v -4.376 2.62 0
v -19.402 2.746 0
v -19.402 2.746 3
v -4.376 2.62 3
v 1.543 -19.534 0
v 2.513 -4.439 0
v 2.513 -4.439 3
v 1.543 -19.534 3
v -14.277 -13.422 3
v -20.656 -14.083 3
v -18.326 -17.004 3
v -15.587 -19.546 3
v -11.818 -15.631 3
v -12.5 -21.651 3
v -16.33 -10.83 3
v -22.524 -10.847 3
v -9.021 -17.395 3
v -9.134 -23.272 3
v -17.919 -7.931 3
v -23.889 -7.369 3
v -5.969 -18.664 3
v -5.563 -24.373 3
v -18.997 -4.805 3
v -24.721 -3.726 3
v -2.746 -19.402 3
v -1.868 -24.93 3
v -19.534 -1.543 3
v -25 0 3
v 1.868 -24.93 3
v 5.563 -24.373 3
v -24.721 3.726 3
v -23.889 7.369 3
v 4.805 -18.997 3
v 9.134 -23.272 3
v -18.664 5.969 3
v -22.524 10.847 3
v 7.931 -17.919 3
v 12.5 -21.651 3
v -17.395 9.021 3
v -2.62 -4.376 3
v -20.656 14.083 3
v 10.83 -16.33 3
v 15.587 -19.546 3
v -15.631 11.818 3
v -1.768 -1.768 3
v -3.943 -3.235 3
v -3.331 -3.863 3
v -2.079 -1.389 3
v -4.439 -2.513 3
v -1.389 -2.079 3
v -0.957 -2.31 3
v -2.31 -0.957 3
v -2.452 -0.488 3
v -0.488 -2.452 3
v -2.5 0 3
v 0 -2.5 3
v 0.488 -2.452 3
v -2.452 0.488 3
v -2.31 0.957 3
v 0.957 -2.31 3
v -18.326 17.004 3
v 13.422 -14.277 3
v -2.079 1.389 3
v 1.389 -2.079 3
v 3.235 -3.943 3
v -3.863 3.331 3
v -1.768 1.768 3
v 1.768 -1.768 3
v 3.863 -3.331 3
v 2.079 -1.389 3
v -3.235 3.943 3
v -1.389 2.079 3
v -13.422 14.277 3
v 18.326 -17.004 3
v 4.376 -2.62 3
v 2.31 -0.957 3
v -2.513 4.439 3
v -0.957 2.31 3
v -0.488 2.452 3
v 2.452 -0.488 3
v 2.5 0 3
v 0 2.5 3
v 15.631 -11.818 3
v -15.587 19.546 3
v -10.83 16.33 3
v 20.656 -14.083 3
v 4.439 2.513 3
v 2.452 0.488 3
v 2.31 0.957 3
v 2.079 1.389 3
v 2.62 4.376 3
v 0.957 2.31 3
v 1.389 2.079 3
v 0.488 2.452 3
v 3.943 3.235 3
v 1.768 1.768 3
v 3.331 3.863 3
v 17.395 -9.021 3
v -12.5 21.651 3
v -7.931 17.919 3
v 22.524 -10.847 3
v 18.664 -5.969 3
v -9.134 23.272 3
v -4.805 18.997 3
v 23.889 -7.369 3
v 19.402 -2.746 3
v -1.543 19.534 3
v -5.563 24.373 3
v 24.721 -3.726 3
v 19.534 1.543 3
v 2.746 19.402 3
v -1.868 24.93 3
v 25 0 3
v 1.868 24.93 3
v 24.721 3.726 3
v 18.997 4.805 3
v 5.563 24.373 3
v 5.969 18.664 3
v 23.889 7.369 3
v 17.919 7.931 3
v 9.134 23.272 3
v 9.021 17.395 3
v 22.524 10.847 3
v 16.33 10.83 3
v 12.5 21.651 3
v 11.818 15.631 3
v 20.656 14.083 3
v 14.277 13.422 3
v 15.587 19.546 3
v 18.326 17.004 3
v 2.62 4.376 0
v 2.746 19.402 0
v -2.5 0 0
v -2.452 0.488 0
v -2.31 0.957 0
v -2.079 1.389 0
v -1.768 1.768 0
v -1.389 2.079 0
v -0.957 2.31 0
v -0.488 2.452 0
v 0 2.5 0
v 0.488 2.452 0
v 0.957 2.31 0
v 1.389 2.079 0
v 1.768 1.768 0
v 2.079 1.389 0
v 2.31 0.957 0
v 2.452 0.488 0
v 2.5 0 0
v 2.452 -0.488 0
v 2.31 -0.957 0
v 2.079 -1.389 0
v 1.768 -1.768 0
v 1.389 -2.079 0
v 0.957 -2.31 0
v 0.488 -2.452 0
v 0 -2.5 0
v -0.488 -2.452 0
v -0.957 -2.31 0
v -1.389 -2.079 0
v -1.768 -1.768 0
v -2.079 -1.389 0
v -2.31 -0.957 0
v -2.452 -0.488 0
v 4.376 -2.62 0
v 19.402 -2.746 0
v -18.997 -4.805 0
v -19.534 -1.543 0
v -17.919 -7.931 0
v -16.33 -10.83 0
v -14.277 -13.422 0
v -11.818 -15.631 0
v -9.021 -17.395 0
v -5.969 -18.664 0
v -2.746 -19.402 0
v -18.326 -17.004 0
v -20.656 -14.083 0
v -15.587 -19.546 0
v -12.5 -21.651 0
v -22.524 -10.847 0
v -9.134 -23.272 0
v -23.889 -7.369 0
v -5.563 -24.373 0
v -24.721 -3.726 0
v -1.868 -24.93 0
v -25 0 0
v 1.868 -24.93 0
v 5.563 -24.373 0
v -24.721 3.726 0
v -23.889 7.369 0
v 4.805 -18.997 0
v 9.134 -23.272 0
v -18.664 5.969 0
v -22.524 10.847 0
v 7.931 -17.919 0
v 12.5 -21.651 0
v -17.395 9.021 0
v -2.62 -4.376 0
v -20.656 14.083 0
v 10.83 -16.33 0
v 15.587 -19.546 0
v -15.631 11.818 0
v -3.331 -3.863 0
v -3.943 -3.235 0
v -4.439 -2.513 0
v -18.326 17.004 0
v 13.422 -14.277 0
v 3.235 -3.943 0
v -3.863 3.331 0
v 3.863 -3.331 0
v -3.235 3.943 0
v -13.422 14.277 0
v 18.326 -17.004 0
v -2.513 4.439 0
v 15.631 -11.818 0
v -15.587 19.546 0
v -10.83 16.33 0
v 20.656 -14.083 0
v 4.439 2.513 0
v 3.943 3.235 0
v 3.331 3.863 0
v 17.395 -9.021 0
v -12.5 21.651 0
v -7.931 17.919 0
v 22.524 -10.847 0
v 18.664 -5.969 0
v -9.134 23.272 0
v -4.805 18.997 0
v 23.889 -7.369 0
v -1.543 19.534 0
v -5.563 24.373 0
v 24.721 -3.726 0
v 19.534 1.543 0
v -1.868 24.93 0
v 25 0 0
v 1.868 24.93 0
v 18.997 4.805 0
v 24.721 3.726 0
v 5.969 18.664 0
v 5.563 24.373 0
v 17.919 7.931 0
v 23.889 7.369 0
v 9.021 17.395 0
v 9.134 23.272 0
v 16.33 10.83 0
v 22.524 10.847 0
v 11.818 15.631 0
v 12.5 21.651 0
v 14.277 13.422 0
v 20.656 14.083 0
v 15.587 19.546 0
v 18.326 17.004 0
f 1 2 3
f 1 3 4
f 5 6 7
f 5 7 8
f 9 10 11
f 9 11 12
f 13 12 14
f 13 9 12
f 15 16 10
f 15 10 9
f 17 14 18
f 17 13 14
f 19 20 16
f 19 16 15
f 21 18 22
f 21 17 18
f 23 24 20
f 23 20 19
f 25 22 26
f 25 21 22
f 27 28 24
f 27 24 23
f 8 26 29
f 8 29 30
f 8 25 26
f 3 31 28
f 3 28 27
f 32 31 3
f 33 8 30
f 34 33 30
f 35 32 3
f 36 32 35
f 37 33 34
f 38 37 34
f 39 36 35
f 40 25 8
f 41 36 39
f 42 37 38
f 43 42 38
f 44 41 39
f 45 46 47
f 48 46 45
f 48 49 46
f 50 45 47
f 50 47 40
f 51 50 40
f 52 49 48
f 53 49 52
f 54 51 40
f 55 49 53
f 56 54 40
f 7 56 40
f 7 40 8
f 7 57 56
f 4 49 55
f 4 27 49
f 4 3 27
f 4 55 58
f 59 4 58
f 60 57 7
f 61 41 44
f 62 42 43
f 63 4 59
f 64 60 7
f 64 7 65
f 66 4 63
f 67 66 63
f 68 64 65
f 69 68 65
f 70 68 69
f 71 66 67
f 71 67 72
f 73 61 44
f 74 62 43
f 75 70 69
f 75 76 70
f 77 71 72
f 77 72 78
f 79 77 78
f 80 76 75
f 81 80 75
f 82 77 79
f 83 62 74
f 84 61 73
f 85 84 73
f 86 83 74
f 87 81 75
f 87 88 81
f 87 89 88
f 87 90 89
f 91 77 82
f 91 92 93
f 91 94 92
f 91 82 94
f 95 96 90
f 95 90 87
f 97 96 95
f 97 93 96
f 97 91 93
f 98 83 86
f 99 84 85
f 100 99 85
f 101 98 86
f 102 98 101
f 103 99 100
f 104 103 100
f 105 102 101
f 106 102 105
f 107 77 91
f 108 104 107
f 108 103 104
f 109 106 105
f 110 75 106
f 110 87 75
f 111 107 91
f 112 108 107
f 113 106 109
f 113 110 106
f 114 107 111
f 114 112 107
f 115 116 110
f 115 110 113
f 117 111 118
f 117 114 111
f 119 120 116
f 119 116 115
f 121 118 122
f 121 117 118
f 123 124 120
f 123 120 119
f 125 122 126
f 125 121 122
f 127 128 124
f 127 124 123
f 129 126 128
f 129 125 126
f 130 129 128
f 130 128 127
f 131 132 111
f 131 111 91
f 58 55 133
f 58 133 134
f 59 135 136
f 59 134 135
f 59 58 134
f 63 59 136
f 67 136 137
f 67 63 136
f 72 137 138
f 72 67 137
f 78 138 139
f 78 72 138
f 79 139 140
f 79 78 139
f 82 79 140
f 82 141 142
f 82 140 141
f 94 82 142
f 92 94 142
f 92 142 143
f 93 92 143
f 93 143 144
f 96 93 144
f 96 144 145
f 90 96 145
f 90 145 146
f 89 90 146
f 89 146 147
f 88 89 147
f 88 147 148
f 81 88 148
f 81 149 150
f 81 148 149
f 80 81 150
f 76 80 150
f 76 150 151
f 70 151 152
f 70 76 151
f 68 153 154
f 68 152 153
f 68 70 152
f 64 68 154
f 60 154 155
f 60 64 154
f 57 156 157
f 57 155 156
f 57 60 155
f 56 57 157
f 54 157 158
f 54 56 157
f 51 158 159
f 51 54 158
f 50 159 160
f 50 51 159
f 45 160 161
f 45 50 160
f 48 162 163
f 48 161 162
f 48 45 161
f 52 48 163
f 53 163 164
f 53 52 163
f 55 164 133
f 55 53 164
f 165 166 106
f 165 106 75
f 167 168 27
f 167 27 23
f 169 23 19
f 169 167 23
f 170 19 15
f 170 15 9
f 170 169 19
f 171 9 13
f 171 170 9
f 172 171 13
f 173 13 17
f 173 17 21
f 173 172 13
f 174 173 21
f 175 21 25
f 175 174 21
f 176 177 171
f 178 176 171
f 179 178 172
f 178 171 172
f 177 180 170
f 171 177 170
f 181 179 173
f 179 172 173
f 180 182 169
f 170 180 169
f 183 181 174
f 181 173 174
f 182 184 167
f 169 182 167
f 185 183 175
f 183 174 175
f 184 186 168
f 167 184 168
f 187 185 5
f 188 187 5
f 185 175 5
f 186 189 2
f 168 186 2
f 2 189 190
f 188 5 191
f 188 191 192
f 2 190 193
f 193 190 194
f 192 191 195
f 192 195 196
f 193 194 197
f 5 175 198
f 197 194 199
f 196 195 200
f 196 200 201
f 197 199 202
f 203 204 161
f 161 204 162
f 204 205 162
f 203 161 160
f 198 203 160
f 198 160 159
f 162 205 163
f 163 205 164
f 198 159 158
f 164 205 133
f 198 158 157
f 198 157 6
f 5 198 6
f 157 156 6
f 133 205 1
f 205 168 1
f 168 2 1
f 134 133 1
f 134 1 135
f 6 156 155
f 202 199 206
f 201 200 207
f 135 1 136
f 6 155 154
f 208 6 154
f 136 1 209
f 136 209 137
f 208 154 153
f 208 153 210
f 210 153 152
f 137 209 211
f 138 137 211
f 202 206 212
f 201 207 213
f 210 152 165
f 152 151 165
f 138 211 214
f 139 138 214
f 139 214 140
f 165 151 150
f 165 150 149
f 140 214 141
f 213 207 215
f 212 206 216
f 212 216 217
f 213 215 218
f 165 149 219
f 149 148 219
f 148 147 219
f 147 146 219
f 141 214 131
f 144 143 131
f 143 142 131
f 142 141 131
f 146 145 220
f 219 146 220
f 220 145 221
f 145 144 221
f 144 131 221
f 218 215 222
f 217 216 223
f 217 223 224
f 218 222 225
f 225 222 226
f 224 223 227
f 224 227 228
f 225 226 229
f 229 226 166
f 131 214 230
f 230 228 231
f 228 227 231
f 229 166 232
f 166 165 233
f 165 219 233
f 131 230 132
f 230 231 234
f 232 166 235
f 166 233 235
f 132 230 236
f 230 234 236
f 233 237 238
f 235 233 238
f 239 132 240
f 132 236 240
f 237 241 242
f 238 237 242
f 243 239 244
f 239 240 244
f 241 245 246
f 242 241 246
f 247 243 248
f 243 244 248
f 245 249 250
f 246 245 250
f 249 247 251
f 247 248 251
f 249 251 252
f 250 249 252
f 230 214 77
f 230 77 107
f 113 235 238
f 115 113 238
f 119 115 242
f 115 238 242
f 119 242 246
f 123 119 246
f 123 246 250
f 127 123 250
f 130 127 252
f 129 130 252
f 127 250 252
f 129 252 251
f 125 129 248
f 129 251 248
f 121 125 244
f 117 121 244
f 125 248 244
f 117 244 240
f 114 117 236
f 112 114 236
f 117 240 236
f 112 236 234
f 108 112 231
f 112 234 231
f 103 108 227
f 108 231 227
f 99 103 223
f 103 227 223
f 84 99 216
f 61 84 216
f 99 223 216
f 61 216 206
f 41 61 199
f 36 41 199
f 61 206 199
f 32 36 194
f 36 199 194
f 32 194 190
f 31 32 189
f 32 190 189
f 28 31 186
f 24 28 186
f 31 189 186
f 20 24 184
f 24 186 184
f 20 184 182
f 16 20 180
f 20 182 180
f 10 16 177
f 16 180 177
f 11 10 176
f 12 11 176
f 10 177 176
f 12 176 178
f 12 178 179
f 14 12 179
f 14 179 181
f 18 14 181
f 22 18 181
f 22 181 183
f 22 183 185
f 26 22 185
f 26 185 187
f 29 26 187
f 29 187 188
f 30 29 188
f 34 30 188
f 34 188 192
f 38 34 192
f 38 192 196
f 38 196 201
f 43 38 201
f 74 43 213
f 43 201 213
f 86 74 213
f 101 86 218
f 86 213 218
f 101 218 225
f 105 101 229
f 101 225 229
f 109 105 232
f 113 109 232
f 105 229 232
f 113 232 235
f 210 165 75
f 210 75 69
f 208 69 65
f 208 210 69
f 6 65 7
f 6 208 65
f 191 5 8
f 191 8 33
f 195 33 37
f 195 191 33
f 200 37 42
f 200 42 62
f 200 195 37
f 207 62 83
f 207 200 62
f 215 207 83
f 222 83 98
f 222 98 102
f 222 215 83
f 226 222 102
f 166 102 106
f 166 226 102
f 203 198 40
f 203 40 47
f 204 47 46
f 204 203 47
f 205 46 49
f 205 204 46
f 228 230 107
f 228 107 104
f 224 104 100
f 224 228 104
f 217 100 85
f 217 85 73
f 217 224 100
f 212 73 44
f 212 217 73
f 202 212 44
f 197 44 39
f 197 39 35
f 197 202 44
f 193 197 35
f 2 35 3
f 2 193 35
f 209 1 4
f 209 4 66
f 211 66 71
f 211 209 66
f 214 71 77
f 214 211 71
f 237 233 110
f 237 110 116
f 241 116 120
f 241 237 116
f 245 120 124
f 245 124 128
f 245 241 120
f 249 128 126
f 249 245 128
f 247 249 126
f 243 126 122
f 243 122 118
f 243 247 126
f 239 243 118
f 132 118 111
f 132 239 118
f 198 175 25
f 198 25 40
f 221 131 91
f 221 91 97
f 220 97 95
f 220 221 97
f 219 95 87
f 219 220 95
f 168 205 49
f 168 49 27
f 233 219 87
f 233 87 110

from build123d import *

# Parameters (mm, degrees)
SKETCH1_R               = 25
BOSS_EXTRUDE1_DEPTH     = 3
CUT_EXTRUDE1_DEPTH      = 36.482389998
CUT_EXTRUDE1_DEPTH_BACK = 36.482389998
SKETCH2_R               = 2.5


with BuildPart() as part:
    # Sketch1 → Boss-Extrude1 (new body)
    with BuildSketch(Plane.XY):
        Circle(SKETCH1_R)
        with BuildLine():
            Line((2.745911262, 19.401997604), (2.620473901, 4.376040727))
            ThreePointArc((2.620473901, 4.376040727), (3.650596033, 3.562269574), (4.438897848, 2.512528966))
            Line((4.438897848, 2.512528966), (19.534473328, 1.54333777))
            ThreePointArc((19.534473328, 1.54333777), (14.277143171, 13.42165126), (2.745911262, 19.401997604))
        make_face(mode=Mode.SUBTRACT)
        with BuildLine():
            Line((2.512528966, -4.438897848), (1.54333777, -19.534473328))
            ThreePointArc((1.54333777, -19.534473328), (13.42165126, -14.277143171), (19.401997604, -2.745911262))
            Line((19.401997604, -2.745911262), (4.376040727, -2.620473901))
            ThreePointArc((4.376040727, -2.620473901), (3.562269574, -3.650596033), (2.512528966, -4.438897848))
        make_face(mode=Mode.SUBTRACT)
        with BuildLine():
            Line((-4.438897848, -2.512528966), (-19.534473328, -1.54333777))
            ThreePointArc((-19.534473328, -1.54333777), (-14.277143171, -13.42165126), (-2.745911262, -19.401997604))
            Line((-2.745911262, -19.401997604), (-2.620473901, -4.376040727))
            ThreePointArc((-2.620473901, -4.376040727), (-3.650596033, -3.562269574), (-4.438897848, -2.512528966))
        make_face(mode=Mode.SUBTRACT)
        with BuildLine():
            Line((-2.512528966, 4.438897848), (-1.54333777, 19.534473328))
            ThreePointArc((-1.54333777, 19.534473328), (-13.42165126, 14.277143171), (-19.401997604, 2.745911262))
            Line((-19.401997604, 2.745911262), (-4.376040727, 2.620473901))
            ThreePointArc((-4.376040727, 2.620473901), (-3.562269574, 3.650596033), (-2.512528966, 4.438897848))
        make_face(mode=Mode.SUBTRACT)
    extrude(amount=BOSS_EXTRUDE1_DEPTH)

    # Sketch2 → Cut-Extrude1 (cut, two sides: drawn at the far end of the back side and taken through both)
    with BuildSketch(Plane(origin=(0, 0, 0), x_dir=(-1, 0, 0), z_dir=(0, 0, -1)).offset(-CUT_EXTRUDE1_DEPTH_BACK)):
        Circle(SKETCH2_R)
    extrude(amount=CUT_EXTRUDE1_DEPTH + CUT_EXTRUDE1_DEPTH_BACK, mode=Mode.SUBTRACT)


solid = part.part
